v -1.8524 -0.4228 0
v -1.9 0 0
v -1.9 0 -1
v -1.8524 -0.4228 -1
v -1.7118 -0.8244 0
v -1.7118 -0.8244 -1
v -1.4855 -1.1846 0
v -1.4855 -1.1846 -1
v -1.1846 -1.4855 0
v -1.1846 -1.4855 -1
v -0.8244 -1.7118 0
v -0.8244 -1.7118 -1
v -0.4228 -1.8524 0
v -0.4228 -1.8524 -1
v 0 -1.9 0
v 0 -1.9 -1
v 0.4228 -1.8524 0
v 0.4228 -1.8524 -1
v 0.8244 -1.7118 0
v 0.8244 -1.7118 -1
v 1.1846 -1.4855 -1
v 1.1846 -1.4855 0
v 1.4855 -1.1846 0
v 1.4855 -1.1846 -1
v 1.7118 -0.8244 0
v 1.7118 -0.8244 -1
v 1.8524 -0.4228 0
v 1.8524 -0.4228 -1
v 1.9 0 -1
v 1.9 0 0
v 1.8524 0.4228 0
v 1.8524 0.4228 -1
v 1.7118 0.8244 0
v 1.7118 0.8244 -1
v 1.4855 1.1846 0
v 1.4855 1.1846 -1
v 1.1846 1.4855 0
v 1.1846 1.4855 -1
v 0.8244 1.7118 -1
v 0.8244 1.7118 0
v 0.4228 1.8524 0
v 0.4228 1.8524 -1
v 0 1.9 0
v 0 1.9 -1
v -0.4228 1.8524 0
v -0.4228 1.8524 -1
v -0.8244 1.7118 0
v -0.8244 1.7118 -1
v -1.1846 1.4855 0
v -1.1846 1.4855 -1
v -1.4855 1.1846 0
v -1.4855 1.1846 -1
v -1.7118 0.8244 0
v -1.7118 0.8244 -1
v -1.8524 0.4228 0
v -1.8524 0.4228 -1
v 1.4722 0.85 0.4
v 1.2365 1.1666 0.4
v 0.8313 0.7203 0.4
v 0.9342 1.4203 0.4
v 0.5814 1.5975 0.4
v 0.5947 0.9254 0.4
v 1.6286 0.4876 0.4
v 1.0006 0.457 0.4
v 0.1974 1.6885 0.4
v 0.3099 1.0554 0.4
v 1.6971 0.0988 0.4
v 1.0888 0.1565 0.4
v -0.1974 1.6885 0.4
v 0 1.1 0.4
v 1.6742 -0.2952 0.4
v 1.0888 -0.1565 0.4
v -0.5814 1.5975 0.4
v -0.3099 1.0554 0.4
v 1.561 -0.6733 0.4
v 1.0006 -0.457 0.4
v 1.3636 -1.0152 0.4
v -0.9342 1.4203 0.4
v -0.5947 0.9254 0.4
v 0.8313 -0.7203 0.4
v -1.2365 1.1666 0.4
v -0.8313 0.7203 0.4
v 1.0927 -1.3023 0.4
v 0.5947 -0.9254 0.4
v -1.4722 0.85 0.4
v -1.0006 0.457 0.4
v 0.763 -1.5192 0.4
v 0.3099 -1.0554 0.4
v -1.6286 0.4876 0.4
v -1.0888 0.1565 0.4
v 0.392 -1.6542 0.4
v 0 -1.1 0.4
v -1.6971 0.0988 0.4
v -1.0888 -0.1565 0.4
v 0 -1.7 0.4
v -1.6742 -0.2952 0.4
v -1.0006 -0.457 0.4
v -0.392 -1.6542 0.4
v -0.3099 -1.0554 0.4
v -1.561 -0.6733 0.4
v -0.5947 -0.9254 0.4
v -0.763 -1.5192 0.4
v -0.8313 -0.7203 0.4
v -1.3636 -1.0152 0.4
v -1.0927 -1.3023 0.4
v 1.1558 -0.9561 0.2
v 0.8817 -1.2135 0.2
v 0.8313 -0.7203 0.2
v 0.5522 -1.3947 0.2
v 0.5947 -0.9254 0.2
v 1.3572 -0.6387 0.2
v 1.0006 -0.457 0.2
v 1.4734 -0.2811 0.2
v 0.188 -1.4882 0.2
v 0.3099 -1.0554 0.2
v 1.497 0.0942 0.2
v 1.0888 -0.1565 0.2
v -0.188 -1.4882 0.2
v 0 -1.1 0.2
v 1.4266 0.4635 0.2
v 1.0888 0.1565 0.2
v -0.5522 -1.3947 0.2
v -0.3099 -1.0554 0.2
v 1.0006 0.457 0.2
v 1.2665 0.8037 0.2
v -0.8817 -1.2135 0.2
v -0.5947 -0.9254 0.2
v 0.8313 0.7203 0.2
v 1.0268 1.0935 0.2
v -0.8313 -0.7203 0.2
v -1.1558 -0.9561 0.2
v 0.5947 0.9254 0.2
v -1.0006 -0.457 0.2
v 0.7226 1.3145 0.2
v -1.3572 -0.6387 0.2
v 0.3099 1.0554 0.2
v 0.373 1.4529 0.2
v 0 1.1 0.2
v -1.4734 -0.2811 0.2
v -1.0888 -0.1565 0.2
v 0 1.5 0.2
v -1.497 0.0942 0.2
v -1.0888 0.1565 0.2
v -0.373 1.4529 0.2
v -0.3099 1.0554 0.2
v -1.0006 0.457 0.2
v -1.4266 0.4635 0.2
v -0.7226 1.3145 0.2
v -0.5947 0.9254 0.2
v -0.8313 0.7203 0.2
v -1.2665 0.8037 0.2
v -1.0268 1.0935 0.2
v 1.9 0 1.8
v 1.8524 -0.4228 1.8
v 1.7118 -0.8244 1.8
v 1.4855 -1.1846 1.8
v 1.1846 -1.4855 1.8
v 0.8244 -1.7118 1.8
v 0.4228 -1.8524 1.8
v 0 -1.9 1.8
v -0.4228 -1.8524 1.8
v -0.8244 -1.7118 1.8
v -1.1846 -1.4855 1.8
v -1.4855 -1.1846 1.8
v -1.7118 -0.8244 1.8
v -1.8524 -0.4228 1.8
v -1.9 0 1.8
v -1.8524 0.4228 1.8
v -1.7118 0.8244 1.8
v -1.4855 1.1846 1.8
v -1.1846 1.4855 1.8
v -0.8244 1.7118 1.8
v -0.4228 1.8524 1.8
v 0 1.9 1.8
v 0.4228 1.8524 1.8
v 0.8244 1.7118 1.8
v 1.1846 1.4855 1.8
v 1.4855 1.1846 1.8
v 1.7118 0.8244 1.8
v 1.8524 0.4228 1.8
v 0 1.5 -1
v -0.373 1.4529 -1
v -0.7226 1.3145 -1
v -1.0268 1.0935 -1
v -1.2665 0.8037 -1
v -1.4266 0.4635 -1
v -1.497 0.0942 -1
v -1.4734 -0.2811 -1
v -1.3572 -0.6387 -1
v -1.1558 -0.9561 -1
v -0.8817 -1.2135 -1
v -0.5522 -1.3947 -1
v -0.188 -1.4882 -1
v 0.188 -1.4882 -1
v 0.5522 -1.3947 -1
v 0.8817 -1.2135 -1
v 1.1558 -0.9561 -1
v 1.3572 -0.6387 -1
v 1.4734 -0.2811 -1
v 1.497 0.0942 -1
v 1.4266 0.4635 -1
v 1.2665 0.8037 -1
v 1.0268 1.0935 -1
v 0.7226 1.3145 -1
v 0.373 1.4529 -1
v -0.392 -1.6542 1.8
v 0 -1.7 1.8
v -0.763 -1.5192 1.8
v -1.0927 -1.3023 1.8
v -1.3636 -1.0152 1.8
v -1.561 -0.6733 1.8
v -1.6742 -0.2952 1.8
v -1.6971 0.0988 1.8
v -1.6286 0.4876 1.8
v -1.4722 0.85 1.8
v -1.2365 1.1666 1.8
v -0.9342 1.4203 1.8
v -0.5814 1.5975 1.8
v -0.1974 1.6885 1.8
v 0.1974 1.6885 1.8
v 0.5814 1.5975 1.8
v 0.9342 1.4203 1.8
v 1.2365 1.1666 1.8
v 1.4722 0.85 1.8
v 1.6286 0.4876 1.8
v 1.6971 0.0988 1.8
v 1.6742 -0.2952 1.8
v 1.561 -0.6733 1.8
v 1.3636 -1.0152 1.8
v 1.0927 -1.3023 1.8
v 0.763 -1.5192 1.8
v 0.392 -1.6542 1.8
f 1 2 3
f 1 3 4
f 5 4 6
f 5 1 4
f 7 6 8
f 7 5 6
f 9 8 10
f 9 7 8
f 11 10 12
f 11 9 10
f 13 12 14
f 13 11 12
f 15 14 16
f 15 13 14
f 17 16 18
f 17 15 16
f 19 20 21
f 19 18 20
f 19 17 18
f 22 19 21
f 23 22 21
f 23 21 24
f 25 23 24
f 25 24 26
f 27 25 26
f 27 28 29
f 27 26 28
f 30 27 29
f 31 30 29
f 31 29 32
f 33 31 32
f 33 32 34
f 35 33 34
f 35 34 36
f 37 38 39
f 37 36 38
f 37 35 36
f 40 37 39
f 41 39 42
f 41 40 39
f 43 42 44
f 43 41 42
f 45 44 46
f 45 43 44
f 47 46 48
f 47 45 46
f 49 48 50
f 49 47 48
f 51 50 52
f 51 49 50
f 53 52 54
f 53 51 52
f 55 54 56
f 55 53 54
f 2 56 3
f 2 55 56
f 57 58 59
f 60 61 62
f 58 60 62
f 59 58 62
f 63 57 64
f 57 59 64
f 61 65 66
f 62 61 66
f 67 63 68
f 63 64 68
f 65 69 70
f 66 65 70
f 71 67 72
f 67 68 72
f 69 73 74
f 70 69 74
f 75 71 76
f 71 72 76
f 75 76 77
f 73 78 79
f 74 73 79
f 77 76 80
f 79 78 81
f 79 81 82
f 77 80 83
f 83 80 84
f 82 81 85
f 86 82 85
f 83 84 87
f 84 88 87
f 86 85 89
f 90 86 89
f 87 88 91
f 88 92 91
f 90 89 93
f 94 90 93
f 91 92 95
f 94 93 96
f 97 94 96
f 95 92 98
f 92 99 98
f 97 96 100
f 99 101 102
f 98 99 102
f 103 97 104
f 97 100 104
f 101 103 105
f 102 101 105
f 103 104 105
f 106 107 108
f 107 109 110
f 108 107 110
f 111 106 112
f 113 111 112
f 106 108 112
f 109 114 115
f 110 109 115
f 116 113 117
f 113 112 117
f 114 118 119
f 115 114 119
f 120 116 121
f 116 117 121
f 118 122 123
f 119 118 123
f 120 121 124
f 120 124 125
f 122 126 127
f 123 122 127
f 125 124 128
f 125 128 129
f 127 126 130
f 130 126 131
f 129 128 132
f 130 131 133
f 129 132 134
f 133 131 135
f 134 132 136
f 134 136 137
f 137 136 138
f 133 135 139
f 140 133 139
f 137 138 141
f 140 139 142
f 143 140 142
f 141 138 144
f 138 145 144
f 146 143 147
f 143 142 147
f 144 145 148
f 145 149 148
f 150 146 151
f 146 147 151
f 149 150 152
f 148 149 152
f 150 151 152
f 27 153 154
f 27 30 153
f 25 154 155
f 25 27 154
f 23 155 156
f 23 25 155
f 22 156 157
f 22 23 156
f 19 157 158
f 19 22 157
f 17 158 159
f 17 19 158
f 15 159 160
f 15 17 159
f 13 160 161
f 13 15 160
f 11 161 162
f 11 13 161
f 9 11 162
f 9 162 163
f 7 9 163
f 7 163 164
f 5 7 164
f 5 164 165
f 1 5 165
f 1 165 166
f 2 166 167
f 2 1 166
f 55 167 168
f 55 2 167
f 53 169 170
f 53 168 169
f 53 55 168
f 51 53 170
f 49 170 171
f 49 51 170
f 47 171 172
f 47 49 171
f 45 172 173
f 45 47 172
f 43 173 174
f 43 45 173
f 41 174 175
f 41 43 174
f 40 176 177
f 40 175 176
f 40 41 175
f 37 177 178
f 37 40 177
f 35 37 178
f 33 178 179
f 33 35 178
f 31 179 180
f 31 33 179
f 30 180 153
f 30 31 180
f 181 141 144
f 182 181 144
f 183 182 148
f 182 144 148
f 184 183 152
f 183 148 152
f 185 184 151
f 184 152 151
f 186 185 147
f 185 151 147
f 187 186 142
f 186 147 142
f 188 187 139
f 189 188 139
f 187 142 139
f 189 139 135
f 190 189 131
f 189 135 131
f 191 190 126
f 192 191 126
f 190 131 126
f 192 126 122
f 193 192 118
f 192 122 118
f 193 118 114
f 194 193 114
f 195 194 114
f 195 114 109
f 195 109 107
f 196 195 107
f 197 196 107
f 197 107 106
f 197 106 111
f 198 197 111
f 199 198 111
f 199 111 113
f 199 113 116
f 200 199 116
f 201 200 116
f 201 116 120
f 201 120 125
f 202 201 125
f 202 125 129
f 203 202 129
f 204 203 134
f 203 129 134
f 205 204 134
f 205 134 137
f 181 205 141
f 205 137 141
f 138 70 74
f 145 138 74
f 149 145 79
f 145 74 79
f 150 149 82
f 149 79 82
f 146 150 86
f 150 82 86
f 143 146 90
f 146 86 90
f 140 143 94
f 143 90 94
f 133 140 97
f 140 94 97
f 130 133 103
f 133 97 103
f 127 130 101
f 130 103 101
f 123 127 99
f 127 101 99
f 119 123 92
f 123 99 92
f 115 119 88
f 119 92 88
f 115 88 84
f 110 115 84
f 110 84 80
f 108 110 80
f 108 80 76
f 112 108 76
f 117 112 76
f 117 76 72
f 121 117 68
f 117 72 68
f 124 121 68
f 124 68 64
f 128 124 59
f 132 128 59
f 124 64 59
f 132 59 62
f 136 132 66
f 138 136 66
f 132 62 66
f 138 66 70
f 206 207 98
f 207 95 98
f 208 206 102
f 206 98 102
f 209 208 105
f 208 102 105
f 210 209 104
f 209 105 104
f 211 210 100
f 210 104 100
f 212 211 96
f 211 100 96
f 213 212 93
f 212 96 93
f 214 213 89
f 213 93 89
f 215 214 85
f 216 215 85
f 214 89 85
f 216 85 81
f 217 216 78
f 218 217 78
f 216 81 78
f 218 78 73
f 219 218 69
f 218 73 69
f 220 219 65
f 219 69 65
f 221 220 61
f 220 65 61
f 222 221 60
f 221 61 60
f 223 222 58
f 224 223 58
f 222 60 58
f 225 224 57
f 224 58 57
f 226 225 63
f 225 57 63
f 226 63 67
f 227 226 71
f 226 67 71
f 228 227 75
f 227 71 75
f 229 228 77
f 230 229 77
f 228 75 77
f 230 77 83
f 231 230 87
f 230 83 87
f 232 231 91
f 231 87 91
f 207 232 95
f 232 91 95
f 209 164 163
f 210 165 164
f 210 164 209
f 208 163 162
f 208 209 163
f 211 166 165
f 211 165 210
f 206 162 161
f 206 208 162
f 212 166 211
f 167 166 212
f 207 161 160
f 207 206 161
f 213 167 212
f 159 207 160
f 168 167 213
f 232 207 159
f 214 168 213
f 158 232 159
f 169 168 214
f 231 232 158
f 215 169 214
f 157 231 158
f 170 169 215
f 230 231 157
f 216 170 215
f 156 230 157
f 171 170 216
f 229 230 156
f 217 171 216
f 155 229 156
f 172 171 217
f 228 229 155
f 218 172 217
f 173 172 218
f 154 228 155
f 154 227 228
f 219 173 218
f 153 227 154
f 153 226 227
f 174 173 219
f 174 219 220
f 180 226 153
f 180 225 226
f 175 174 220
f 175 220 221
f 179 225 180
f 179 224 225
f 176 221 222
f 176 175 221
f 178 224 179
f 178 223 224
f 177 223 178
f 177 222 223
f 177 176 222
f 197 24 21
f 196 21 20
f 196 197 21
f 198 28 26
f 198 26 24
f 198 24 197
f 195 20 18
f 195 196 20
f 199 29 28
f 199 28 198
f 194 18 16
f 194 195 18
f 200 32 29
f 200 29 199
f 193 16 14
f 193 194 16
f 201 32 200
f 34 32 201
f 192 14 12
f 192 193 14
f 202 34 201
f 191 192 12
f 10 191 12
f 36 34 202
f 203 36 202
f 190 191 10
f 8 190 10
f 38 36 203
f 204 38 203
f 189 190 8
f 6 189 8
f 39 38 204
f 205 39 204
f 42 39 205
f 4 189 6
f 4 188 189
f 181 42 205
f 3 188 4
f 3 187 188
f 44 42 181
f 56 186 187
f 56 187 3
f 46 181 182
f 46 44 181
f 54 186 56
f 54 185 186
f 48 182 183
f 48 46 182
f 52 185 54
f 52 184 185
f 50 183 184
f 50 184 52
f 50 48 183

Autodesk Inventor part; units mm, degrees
ref_plane "YZ Plane" through (0, 0, 0) normal (1, 0, 0) x (0, 1, 0)
ref_plane "XZ Plane" through (0, 0, 0) normal (0, 1, 0) x (-1, 0, 0)
ref_plane "XY Plane" through (0, 0, 0) normal (0, 0, 1) x (1, 0, 0)
sketch "Sketch1" plane through (0, 0, 0) normal (0, 0, 1) x (1, 0, 0)
  circle A0 centre (0, 0) radius 1.9
  dimension "d0" = 3.8
extrude "Extrusion1" add sketch "Sketch1" along normal blind 1.8
hole "Hole1" at (0, 0, 1.8) direction (0, 0, -1) diameter 3.4 depth 1.4
sketch "Sketch2" plane through (0, 0, 0) normal (0, 0, -1) x (-1, 0, 0)
  circle A0 centre (0, 0) radius 1.9 projected
  circle A1 centre (0, 0) radius 1.9
  dimension "d12" = 3.8
extrude "Extrusion2" add sketch "Sketch2" along normal blind 1
hole "Hole2" at (0, 0, -1) direction (0, 0, 1) diameter 2.2 end through all
hole "Hole3" at (0, 0, -1) direction (0, 0, 1) diameter 3 depth 1.2
properties part number "MU_Bearing_Retainer" material "Aluminum-6061"
